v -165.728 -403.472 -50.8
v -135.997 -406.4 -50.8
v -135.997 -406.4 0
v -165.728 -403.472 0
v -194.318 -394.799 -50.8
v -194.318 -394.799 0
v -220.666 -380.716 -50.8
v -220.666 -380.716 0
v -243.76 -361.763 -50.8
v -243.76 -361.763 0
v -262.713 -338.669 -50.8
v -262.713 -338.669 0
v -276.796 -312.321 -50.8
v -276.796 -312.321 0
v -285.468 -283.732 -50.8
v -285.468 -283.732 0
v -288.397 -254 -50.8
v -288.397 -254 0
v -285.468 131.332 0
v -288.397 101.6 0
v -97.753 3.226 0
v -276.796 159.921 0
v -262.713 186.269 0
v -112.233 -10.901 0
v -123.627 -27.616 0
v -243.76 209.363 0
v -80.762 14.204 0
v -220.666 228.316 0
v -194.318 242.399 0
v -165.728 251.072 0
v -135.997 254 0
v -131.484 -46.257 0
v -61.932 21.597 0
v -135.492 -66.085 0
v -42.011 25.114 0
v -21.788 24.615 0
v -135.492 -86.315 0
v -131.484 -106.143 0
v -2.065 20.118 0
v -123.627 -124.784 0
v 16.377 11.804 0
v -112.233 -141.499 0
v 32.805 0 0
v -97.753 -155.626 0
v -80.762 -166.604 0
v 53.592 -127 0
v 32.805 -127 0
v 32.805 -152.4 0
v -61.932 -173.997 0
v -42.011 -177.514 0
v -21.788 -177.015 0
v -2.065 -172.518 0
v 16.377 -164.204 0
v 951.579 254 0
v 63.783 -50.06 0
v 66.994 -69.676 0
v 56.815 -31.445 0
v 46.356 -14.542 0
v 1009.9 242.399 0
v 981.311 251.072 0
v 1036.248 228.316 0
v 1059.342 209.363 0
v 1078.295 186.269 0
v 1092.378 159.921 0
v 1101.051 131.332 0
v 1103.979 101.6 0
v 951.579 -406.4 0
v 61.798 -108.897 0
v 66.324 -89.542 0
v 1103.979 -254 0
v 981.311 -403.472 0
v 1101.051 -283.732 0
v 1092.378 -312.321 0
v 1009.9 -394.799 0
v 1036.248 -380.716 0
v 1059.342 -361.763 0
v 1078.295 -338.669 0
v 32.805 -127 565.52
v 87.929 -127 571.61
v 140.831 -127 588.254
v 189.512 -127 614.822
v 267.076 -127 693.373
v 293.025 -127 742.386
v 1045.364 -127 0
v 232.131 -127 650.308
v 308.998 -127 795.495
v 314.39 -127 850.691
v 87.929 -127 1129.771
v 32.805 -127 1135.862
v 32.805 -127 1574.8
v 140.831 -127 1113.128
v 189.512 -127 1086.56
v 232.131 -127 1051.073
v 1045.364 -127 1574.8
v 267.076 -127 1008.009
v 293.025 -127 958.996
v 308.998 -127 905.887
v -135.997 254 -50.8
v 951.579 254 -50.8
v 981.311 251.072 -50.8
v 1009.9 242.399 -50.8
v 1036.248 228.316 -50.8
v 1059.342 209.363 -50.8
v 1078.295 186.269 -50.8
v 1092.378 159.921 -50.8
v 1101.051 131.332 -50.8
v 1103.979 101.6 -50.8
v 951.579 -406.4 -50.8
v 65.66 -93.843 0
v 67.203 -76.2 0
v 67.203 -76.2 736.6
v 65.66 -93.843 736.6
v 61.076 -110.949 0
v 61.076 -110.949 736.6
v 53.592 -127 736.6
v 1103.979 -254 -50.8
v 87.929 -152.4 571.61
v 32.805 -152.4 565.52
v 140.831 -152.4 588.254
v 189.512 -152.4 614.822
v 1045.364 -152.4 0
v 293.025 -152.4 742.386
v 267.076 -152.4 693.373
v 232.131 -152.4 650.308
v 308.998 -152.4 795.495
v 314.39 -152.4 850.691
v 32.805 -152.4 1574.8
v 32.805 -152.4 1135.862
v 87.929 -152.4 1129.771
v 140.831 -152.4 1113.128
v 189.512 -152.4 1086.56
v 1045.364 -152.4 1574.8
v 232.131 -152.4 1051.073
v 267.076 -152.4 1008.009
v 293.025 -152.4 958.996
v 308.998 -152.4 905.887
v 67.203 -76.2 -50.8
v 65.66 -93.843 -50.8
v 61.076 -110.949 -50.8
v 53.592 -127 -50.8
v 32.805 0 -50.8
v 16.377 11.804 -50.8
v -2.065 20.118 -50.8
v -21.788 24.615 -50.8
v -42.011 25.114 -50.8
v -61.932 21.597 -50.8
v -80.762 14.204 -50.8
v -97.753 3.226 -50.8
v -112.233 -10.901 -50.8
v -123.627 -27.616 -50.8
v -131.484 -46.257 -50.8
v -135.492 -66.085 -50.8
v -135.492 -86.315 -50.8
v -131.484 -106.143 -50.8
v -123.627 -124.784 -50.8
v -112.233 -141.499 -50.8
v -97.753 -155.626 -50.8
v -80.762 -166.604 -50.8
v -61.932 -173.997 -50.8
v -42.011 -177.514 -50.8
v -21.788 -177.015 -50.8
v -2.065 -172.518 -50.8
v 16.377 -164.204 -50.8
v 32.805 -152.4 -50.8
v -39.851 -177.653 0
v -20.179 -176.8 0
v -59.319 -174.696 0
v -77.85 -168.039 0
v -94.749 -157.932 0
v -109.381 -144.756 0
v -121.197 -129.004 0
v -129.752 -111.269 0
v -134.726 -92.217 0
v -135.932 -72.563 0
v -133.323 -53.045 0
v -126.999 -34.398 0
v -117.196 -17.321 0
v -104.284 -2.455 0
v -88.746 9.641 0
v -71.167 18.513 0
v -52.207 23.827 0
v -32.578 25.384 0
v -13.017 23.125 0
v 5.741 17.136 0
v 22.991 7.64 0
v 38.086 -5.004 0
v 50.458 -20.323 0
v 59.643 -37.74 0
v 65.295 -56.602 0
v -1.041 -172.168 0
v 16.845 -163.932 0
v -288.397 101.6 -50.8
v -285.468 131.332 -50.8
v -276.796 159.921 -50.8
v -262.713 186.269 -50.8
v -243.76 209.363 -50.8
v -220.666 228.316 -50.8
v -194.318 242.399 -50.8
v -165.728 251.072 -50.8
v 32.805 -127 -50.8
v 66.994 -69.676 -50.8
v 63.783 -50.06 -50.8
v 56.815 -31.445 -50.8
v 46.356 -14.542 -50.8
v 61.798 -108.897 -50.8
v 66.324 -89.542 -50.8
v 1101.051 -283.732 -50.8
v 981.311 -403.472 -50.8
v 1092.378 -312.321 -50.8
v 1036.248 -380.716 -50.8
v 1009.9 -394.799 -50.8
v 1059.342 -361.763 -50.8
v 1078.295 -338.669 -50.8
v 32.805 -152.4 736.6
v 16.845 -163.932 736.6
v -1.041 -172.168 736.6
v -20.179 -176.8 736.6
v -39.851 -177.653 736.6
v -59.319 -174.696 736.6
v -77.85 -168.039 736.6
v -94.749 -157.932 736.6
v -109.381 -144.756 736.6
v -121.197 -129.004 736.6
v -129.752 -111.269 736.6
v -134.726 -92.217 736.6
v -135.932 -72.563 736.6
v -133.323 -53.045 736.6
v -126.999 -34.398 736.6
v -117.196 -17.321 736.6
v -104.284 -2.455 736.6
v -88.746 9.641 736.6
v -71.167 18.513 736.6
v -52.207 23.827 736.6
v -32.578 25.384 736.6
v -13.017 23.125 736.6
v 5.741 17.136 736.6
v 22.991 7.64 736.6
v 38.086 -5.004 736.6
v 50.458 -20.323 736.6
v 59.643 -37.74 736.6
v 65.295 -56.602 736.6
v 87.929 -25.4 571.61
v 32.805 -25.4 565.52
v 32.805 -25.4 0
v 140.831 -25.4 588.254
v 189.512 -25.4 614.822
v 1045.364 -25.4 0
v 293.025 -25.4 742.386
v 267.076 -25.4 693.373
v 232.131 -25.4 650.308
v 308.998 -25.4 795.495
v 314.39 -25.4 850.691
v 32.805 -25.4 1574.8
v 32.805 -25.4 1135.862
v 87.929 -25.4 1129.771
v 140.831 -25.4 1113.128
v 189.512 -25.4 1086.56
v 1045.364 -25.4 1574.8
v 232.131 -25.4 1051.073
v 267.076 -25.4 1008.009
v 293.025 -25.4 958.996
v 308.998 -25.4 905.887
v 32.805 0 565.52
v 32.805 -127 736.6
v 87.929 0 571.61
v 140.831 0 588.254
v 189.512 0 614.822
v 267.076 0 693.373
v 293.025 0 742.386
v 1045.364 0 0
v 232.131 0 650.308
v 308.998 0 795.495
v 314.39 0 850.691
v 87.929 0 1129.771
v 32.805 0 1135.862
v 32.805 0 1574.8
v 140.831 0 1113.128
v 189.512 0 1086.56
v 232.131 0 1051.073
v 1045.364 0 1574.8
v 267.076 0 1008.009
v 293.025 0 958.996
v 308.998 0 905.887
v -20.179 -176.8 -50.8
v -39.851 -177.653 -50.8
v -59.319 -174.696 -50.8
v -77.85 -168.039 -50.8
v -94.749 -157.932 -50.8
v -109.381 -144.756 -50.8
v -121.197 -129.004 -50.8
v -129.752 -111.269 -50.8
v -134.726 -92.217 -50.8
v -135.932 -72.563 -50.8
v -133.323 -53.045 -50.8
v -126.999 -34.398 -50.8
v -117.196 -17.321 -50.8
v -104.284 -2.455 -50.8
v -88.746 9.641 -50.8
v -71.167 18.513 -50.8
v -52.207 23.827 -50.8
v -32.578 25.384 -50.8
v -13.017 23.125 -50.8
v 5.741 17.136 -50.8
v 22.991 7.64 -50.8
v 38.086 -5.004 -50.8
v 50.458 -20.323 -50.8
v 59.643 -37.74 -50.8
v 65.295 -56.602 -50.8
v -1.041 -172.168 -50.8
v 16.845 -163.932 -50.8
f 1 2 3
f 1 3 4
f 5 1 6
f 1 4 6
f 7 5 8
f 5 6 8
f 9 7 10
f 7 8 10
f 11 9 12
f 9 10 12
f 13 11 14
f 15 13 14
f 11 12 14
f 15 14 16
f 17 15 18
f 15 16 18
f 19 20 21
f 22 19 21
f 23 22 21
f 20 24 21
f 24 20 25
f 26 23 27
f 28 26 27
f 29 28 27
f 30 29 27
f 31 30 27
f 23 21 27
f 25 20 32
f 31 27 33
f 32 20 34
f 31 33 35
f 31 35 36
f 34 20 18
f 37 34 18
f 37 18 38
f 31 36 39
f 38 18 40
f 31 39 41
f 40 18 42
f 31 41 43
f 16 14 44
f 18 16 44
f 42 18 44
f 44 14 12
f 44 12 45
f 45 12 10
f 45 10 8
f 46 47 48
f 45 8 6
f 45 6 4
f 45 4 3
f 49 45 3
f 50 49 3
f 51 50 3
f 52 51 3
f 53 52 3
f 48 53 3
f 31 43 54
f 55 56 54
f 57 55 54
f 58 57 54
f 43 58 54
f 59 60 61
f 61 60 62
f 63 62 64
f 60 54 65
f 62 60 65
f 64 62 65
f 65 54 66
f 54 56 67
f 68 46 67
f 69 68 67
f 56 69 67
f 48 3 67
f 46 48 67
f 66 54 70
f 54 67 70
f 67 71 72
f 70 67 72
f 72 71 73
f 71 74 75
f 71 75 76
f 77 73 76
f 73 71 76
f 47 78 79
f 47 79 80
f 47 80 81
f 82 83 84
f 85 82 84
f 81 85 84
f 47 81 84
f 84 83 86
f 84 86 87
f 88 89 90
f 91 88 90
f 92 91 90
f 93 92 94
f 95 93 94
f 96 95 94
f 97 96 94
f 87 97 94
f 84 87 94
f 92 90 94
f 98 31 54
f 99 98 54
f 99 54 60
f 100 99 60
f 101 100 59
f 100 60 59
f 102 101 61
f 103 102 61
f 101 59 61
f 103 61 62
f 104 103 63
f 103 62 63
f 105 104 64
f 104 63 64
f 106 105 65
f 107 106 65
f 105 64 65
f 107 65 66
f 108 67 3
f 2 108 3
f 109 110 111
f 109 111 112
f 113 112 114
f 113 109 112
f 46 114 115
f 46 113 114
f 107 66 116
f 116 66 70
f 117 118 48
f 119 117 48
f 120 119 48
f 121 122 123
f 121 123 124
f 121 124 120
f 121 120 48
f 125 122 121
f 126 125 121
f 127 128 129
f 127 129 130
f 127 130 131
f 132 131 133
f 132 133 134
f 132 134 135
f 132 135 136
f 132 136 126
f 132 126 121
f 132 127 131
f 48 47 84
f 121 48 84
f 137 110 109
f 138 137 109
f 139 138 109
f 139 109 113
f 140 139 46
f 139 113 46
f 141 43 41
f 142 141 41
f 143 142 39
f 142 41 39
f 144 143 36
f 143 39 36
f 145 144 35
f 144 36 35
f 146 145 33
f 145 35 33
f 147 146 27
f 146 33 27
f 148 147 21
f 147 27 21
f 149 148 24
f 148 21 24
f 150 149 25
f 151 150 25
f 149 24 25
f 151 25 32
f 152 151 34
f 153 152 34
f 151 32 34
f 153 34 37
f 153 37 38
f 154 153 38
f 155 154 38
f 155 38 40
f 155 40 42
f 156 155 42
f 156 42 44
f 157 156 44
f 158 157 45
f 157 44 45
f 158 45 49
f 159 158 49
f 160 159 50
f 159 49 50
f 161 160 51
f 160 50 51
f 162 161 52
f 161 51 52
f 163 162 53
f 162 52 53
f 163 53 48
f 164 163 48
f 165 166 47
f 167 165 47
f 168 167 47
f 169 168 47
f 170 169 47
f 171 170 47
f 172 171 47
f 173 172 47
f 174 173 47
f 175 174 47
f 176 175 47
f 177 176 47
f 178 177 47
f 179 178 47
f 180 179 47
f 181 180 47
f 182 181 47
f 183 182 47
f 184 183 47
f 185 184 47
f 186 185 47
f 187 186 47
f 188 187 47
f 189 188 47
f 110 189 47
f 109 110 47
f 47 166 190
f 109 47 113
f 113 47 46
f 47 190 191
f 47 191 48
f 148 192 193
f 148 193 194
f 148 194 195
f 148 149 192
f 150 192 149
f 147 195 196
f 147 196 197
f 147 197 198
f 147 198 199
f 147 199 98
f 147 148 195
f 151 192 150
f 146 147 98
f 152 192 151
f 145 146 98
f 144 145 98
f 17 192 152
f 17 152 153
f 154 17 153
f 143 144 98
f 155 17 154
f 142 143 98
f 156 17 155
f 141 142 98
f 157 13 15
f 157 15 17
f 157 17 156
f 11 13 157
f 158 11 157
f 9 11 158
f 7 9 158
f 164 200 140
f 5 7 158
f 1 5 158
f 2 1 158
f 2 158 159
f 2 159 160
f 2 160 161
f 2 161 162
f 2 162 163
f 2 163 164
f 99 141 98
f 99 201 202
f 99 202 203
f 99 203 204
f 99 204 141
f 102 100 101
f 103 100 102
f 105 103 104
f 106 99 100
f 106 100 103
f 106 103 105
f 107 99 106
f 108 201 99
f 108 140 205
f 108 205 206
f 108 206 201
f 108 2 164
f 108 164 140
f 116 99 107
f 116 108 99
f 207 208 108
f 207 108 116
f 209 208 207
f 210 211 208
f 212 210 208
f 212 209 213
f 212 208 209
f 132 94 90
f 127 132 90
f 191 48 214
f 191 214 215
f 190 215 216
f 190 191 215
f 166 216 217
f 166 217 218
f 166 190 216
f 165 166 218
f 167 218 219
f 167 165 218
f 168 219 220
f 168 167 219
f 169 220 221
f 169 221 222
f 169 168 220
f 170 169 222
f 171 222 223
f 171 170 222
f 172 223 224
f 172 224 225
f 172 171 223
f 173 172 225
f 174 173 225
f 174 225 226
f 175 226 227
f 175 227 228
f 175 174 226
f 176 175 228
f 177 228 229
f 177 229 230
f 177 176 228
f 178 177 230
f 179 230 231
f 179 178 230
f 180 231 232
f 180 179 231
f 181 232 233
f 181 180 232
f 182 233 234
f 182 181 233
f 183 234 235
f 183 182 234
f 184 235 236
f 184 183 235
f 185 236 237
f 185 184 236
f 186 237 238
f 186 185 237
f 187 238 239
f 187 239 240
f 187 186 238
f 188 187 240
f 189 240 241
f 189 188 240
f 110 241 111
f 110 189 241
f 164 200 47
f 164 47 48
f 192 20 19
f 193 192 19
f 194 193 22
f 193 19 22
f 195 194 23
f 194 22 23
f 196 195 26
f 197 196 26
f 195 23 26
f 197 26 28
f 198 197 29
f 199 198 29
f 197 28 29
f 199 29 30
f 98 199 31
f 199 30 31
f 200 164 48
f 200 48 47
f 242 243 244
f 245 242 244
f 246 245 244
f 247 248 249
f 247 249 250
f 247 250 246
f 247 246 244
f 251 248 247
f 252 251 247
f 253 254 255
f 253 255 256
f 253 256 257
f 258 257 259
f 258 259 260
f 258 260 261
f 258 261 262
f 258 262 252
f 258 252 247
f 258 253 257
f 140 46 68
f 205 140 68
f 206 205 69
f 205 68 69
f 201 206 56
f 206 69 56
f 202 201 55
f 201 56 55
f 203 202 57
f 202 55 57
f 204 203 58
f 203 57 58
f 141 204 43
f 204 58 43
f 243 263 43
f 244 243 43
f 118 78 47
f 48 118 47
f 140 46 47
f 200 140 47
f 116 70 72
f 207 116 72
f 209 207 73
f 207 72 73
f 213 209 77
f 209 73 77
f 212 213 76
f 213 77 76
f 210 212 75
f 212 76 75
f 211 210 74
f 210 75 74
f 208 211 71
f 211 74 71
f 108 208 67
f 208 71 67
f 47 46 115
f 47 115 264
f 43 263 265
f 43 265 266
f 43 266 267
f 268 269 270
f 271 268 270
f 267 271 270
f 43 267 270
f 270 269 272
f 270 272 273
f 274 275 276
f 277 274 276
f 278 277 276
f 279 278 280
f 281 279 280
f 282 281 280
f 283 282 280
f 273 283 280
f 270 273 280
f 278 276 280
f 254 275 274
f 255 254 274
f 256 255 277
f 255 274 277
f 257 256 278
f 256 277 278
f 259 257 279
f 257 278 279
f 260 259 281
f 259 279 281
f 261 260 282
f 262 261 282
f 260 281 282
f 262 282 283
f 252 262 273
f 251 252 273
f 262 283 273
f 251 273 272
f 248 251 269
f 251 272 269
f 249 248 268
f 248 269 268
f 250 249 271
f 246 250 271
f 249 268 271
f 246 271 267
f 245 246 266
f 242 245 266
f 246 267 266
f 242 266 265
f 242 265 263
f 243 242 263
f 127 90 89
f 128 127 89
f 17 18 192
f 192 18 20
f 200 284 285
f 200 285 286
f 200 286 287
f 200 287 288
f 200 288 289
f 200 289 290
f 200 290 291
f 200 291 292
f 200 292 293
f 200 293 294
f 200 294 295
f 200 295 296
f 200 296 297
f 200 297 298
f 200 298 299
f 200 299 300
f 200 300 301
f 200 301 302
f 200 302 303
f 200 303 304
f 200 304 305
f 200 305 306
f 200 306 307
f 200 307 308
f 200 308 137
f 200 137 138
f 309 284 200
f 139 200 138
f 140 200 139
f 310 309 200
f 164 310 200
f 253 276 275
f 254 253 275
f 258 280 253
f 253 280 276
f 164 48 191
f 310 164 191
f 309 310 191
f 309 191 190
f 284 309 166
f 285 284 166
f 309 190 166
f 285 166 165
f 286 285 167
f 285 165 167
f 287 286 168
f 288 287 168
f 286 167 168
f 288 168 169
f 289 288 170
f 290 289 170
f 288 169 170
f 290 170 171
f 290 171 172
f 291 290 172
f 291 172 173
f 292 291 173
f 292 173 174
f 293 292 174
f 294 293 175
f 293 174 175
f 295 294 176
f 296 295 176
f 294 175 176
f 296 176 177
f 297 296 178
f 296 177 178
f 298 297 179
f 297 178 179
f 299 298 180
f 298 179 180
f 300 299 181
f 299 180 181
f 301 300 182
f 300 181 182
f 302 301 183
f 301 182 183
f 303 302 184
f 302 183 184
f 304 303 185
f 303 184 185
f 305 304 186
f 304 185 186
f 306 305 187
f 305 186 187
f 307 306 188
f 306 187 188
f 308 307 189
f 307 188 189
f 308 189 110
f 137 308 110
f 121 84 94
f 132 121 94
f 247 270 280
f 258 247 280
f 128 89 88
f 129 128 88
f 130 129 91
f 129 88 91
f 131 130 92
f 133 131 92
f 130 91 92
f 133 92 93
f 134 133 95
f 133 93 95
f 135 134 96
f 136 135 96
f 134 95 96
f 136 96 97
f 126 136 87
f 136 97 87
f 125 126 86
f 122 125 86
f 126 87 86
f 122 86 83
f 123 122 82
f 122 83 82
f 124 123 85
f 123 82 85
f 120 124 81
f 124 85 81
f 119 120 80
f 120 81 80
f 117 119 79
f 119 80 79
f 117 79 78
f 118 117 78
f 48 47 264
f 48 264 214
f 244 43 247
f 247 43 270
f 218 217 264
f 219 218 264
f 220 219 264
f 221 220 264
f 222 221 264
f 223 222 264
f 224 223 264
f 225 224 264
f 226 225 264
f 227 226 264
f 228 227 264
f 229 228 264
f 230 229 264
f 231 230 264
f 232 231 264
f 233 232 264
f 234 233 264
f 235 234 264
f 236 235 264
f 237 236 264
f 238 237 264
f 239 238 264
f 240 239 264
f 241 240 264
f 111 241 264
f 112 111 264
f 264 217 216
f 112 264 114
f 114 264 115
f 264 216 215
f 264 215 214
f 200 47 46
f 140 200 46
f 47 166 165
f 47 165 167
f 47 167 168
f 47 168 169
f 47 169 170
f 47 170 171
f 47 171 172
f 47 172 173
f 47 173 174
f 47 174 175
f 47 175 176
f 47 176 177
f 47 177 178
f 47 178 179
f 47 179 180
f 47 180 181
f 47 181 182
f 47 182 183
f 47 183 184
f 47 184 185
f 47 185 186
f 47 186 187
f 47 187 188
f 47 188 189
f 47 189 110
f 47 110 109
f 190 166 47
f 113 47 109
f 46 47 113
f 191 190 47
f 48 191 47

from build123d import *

# Parameters (mm, degrees)
F2_DEPTH = 152.4
F3_W     = 1012.558711063
F3_H     = 101.6
F4_DEPTH = 1574.8
F6_DEPTH = 736.6
F8_DEPTH = 50.8
F9_DEPTH = 50.8


with BuildPart() as f2:
    # F1 (on Front) → F2 (new body)
    with BuildSketch(Plane.XZ):
        with BuildLine():
            ThreePointArc((32.8054452588, 1135.8617189374), (314.3900531211, 850.6908187111), (32.8054452588, 565.5199184849))
            Line((32.8054452588, 565.5199184849), (32.8054452588, 0))
            Line((32.8054452588, 0), (1045.3641563217, 0))
            Line((1045.3641563217, 0), (1045.3641563217, 1574.8))
            Line((1045.3641563217, 1574.8), (32.8054452588, 1574.8))
            Line((32.8054452588, 1574.8), (32.8054452588, 1135.8617189374))
        make_face()
    extrude(amount=F2_DEPTH)

    # F3 (on face) → F4 (cut)
    with BuildSketch(Plane.XY.offset(1574.8)):
        with Locations((539.0848007902, -76.2)):
            Rectangle(F3_W, F3_H)
    extrude(amount=-F4_DEPTH, mode=Mode.SUBTRACT)


with BuildPart() as f6:
    # F5 (on face) → F6 (new body)
    with BuildSketch(Plane(origin=(0, 0, 0), x_dir=(1, 0, 0), z_dir=(0, 0, -1))):
        with BuildLine():
            Line((32.8054452588, 127), (32.8054452588, 152.4))
            ThreePointArc((32.8054452588, 152.4), (-135.9966380423, 76.2), (32.8054452588, 0))
            ThreePointArc((32.8054452588, 0), (58.2054452588, 34.397916699), (67.2033619577, 76.2))
            ThreePointArc((67.2033619577, 76.2), (63.7414259087, 102.4960149824), (53.5915429822, 127))
            Line((53.5915429822, 127), (32.8054452588, 127))
        make_face()
    extrude(amount=-F6_DEPTH)


with BuildPart() as f8:
    # F7 (on face) → F8 (new body)
    with BuildSketch(Plane(origin=(0, 0, 0), x_dir=(1, 0, 0), z_dir=(0, 0, -1))):
        with BuildLine():
            Line((951.5788722992, 406.4), (-135.9966380423, 406.4))
            ThreePointArc((-135.9966380423, 406.4), (-243.7597114951, 361.7630734528), (-288.3966380423, 254))
            Line((-288.3966380423, 254), (-288.3966380423, -101.6))
            ThreePointArc((-288.3966380423, -101.6), (-243.7597114951, -209.3630734528), (-135.9966380423, -254))
            Line((-135.9966380423, -254), (951.5788722992, -254))
            ThreePointArc((951.5788722992, -254), (1059.341945752, -209.3630734528), (1103.9788722992, -101.6))
            Line((1103.9788722992, -101.6), (1103.9788722992, 254))
            ThreePointArc((1103.9788722992, 254), (1059.341945752, 361.7630734528), (951.5788722992, 406.4))
        make_face()
        with BuildLine():
            Line((32.8054452588, 127), (53.5915429822, 127))
            ThreePointArc((53.5915429822, 127), (65.8692810696, 59.7894709213), (32.8054452588, 0))
            ThreePointArc((32.8054452588, 0), (-135.9966380423, 76.2), (32.8054452588, 152.4))
            Line((32.8054452588, 152.4), (32.8054452588, 127))
        make_face(mode=Mode.SUBTRACT)
    extrude(amount=F8_DEPTH)


with BuildPart() as f9:
    # F9 (new): a face of the model
    f9_faces = [f6.part.faces().sort_by_distance(p)[0] for p in [
        (-35.0765413832, -75.6550871549, 0),
    ]]
    extrude(f9_faces, amount=F9_DEPTH)


solid = Compound([f2.part, f6.part, f8.part, f9.part])
